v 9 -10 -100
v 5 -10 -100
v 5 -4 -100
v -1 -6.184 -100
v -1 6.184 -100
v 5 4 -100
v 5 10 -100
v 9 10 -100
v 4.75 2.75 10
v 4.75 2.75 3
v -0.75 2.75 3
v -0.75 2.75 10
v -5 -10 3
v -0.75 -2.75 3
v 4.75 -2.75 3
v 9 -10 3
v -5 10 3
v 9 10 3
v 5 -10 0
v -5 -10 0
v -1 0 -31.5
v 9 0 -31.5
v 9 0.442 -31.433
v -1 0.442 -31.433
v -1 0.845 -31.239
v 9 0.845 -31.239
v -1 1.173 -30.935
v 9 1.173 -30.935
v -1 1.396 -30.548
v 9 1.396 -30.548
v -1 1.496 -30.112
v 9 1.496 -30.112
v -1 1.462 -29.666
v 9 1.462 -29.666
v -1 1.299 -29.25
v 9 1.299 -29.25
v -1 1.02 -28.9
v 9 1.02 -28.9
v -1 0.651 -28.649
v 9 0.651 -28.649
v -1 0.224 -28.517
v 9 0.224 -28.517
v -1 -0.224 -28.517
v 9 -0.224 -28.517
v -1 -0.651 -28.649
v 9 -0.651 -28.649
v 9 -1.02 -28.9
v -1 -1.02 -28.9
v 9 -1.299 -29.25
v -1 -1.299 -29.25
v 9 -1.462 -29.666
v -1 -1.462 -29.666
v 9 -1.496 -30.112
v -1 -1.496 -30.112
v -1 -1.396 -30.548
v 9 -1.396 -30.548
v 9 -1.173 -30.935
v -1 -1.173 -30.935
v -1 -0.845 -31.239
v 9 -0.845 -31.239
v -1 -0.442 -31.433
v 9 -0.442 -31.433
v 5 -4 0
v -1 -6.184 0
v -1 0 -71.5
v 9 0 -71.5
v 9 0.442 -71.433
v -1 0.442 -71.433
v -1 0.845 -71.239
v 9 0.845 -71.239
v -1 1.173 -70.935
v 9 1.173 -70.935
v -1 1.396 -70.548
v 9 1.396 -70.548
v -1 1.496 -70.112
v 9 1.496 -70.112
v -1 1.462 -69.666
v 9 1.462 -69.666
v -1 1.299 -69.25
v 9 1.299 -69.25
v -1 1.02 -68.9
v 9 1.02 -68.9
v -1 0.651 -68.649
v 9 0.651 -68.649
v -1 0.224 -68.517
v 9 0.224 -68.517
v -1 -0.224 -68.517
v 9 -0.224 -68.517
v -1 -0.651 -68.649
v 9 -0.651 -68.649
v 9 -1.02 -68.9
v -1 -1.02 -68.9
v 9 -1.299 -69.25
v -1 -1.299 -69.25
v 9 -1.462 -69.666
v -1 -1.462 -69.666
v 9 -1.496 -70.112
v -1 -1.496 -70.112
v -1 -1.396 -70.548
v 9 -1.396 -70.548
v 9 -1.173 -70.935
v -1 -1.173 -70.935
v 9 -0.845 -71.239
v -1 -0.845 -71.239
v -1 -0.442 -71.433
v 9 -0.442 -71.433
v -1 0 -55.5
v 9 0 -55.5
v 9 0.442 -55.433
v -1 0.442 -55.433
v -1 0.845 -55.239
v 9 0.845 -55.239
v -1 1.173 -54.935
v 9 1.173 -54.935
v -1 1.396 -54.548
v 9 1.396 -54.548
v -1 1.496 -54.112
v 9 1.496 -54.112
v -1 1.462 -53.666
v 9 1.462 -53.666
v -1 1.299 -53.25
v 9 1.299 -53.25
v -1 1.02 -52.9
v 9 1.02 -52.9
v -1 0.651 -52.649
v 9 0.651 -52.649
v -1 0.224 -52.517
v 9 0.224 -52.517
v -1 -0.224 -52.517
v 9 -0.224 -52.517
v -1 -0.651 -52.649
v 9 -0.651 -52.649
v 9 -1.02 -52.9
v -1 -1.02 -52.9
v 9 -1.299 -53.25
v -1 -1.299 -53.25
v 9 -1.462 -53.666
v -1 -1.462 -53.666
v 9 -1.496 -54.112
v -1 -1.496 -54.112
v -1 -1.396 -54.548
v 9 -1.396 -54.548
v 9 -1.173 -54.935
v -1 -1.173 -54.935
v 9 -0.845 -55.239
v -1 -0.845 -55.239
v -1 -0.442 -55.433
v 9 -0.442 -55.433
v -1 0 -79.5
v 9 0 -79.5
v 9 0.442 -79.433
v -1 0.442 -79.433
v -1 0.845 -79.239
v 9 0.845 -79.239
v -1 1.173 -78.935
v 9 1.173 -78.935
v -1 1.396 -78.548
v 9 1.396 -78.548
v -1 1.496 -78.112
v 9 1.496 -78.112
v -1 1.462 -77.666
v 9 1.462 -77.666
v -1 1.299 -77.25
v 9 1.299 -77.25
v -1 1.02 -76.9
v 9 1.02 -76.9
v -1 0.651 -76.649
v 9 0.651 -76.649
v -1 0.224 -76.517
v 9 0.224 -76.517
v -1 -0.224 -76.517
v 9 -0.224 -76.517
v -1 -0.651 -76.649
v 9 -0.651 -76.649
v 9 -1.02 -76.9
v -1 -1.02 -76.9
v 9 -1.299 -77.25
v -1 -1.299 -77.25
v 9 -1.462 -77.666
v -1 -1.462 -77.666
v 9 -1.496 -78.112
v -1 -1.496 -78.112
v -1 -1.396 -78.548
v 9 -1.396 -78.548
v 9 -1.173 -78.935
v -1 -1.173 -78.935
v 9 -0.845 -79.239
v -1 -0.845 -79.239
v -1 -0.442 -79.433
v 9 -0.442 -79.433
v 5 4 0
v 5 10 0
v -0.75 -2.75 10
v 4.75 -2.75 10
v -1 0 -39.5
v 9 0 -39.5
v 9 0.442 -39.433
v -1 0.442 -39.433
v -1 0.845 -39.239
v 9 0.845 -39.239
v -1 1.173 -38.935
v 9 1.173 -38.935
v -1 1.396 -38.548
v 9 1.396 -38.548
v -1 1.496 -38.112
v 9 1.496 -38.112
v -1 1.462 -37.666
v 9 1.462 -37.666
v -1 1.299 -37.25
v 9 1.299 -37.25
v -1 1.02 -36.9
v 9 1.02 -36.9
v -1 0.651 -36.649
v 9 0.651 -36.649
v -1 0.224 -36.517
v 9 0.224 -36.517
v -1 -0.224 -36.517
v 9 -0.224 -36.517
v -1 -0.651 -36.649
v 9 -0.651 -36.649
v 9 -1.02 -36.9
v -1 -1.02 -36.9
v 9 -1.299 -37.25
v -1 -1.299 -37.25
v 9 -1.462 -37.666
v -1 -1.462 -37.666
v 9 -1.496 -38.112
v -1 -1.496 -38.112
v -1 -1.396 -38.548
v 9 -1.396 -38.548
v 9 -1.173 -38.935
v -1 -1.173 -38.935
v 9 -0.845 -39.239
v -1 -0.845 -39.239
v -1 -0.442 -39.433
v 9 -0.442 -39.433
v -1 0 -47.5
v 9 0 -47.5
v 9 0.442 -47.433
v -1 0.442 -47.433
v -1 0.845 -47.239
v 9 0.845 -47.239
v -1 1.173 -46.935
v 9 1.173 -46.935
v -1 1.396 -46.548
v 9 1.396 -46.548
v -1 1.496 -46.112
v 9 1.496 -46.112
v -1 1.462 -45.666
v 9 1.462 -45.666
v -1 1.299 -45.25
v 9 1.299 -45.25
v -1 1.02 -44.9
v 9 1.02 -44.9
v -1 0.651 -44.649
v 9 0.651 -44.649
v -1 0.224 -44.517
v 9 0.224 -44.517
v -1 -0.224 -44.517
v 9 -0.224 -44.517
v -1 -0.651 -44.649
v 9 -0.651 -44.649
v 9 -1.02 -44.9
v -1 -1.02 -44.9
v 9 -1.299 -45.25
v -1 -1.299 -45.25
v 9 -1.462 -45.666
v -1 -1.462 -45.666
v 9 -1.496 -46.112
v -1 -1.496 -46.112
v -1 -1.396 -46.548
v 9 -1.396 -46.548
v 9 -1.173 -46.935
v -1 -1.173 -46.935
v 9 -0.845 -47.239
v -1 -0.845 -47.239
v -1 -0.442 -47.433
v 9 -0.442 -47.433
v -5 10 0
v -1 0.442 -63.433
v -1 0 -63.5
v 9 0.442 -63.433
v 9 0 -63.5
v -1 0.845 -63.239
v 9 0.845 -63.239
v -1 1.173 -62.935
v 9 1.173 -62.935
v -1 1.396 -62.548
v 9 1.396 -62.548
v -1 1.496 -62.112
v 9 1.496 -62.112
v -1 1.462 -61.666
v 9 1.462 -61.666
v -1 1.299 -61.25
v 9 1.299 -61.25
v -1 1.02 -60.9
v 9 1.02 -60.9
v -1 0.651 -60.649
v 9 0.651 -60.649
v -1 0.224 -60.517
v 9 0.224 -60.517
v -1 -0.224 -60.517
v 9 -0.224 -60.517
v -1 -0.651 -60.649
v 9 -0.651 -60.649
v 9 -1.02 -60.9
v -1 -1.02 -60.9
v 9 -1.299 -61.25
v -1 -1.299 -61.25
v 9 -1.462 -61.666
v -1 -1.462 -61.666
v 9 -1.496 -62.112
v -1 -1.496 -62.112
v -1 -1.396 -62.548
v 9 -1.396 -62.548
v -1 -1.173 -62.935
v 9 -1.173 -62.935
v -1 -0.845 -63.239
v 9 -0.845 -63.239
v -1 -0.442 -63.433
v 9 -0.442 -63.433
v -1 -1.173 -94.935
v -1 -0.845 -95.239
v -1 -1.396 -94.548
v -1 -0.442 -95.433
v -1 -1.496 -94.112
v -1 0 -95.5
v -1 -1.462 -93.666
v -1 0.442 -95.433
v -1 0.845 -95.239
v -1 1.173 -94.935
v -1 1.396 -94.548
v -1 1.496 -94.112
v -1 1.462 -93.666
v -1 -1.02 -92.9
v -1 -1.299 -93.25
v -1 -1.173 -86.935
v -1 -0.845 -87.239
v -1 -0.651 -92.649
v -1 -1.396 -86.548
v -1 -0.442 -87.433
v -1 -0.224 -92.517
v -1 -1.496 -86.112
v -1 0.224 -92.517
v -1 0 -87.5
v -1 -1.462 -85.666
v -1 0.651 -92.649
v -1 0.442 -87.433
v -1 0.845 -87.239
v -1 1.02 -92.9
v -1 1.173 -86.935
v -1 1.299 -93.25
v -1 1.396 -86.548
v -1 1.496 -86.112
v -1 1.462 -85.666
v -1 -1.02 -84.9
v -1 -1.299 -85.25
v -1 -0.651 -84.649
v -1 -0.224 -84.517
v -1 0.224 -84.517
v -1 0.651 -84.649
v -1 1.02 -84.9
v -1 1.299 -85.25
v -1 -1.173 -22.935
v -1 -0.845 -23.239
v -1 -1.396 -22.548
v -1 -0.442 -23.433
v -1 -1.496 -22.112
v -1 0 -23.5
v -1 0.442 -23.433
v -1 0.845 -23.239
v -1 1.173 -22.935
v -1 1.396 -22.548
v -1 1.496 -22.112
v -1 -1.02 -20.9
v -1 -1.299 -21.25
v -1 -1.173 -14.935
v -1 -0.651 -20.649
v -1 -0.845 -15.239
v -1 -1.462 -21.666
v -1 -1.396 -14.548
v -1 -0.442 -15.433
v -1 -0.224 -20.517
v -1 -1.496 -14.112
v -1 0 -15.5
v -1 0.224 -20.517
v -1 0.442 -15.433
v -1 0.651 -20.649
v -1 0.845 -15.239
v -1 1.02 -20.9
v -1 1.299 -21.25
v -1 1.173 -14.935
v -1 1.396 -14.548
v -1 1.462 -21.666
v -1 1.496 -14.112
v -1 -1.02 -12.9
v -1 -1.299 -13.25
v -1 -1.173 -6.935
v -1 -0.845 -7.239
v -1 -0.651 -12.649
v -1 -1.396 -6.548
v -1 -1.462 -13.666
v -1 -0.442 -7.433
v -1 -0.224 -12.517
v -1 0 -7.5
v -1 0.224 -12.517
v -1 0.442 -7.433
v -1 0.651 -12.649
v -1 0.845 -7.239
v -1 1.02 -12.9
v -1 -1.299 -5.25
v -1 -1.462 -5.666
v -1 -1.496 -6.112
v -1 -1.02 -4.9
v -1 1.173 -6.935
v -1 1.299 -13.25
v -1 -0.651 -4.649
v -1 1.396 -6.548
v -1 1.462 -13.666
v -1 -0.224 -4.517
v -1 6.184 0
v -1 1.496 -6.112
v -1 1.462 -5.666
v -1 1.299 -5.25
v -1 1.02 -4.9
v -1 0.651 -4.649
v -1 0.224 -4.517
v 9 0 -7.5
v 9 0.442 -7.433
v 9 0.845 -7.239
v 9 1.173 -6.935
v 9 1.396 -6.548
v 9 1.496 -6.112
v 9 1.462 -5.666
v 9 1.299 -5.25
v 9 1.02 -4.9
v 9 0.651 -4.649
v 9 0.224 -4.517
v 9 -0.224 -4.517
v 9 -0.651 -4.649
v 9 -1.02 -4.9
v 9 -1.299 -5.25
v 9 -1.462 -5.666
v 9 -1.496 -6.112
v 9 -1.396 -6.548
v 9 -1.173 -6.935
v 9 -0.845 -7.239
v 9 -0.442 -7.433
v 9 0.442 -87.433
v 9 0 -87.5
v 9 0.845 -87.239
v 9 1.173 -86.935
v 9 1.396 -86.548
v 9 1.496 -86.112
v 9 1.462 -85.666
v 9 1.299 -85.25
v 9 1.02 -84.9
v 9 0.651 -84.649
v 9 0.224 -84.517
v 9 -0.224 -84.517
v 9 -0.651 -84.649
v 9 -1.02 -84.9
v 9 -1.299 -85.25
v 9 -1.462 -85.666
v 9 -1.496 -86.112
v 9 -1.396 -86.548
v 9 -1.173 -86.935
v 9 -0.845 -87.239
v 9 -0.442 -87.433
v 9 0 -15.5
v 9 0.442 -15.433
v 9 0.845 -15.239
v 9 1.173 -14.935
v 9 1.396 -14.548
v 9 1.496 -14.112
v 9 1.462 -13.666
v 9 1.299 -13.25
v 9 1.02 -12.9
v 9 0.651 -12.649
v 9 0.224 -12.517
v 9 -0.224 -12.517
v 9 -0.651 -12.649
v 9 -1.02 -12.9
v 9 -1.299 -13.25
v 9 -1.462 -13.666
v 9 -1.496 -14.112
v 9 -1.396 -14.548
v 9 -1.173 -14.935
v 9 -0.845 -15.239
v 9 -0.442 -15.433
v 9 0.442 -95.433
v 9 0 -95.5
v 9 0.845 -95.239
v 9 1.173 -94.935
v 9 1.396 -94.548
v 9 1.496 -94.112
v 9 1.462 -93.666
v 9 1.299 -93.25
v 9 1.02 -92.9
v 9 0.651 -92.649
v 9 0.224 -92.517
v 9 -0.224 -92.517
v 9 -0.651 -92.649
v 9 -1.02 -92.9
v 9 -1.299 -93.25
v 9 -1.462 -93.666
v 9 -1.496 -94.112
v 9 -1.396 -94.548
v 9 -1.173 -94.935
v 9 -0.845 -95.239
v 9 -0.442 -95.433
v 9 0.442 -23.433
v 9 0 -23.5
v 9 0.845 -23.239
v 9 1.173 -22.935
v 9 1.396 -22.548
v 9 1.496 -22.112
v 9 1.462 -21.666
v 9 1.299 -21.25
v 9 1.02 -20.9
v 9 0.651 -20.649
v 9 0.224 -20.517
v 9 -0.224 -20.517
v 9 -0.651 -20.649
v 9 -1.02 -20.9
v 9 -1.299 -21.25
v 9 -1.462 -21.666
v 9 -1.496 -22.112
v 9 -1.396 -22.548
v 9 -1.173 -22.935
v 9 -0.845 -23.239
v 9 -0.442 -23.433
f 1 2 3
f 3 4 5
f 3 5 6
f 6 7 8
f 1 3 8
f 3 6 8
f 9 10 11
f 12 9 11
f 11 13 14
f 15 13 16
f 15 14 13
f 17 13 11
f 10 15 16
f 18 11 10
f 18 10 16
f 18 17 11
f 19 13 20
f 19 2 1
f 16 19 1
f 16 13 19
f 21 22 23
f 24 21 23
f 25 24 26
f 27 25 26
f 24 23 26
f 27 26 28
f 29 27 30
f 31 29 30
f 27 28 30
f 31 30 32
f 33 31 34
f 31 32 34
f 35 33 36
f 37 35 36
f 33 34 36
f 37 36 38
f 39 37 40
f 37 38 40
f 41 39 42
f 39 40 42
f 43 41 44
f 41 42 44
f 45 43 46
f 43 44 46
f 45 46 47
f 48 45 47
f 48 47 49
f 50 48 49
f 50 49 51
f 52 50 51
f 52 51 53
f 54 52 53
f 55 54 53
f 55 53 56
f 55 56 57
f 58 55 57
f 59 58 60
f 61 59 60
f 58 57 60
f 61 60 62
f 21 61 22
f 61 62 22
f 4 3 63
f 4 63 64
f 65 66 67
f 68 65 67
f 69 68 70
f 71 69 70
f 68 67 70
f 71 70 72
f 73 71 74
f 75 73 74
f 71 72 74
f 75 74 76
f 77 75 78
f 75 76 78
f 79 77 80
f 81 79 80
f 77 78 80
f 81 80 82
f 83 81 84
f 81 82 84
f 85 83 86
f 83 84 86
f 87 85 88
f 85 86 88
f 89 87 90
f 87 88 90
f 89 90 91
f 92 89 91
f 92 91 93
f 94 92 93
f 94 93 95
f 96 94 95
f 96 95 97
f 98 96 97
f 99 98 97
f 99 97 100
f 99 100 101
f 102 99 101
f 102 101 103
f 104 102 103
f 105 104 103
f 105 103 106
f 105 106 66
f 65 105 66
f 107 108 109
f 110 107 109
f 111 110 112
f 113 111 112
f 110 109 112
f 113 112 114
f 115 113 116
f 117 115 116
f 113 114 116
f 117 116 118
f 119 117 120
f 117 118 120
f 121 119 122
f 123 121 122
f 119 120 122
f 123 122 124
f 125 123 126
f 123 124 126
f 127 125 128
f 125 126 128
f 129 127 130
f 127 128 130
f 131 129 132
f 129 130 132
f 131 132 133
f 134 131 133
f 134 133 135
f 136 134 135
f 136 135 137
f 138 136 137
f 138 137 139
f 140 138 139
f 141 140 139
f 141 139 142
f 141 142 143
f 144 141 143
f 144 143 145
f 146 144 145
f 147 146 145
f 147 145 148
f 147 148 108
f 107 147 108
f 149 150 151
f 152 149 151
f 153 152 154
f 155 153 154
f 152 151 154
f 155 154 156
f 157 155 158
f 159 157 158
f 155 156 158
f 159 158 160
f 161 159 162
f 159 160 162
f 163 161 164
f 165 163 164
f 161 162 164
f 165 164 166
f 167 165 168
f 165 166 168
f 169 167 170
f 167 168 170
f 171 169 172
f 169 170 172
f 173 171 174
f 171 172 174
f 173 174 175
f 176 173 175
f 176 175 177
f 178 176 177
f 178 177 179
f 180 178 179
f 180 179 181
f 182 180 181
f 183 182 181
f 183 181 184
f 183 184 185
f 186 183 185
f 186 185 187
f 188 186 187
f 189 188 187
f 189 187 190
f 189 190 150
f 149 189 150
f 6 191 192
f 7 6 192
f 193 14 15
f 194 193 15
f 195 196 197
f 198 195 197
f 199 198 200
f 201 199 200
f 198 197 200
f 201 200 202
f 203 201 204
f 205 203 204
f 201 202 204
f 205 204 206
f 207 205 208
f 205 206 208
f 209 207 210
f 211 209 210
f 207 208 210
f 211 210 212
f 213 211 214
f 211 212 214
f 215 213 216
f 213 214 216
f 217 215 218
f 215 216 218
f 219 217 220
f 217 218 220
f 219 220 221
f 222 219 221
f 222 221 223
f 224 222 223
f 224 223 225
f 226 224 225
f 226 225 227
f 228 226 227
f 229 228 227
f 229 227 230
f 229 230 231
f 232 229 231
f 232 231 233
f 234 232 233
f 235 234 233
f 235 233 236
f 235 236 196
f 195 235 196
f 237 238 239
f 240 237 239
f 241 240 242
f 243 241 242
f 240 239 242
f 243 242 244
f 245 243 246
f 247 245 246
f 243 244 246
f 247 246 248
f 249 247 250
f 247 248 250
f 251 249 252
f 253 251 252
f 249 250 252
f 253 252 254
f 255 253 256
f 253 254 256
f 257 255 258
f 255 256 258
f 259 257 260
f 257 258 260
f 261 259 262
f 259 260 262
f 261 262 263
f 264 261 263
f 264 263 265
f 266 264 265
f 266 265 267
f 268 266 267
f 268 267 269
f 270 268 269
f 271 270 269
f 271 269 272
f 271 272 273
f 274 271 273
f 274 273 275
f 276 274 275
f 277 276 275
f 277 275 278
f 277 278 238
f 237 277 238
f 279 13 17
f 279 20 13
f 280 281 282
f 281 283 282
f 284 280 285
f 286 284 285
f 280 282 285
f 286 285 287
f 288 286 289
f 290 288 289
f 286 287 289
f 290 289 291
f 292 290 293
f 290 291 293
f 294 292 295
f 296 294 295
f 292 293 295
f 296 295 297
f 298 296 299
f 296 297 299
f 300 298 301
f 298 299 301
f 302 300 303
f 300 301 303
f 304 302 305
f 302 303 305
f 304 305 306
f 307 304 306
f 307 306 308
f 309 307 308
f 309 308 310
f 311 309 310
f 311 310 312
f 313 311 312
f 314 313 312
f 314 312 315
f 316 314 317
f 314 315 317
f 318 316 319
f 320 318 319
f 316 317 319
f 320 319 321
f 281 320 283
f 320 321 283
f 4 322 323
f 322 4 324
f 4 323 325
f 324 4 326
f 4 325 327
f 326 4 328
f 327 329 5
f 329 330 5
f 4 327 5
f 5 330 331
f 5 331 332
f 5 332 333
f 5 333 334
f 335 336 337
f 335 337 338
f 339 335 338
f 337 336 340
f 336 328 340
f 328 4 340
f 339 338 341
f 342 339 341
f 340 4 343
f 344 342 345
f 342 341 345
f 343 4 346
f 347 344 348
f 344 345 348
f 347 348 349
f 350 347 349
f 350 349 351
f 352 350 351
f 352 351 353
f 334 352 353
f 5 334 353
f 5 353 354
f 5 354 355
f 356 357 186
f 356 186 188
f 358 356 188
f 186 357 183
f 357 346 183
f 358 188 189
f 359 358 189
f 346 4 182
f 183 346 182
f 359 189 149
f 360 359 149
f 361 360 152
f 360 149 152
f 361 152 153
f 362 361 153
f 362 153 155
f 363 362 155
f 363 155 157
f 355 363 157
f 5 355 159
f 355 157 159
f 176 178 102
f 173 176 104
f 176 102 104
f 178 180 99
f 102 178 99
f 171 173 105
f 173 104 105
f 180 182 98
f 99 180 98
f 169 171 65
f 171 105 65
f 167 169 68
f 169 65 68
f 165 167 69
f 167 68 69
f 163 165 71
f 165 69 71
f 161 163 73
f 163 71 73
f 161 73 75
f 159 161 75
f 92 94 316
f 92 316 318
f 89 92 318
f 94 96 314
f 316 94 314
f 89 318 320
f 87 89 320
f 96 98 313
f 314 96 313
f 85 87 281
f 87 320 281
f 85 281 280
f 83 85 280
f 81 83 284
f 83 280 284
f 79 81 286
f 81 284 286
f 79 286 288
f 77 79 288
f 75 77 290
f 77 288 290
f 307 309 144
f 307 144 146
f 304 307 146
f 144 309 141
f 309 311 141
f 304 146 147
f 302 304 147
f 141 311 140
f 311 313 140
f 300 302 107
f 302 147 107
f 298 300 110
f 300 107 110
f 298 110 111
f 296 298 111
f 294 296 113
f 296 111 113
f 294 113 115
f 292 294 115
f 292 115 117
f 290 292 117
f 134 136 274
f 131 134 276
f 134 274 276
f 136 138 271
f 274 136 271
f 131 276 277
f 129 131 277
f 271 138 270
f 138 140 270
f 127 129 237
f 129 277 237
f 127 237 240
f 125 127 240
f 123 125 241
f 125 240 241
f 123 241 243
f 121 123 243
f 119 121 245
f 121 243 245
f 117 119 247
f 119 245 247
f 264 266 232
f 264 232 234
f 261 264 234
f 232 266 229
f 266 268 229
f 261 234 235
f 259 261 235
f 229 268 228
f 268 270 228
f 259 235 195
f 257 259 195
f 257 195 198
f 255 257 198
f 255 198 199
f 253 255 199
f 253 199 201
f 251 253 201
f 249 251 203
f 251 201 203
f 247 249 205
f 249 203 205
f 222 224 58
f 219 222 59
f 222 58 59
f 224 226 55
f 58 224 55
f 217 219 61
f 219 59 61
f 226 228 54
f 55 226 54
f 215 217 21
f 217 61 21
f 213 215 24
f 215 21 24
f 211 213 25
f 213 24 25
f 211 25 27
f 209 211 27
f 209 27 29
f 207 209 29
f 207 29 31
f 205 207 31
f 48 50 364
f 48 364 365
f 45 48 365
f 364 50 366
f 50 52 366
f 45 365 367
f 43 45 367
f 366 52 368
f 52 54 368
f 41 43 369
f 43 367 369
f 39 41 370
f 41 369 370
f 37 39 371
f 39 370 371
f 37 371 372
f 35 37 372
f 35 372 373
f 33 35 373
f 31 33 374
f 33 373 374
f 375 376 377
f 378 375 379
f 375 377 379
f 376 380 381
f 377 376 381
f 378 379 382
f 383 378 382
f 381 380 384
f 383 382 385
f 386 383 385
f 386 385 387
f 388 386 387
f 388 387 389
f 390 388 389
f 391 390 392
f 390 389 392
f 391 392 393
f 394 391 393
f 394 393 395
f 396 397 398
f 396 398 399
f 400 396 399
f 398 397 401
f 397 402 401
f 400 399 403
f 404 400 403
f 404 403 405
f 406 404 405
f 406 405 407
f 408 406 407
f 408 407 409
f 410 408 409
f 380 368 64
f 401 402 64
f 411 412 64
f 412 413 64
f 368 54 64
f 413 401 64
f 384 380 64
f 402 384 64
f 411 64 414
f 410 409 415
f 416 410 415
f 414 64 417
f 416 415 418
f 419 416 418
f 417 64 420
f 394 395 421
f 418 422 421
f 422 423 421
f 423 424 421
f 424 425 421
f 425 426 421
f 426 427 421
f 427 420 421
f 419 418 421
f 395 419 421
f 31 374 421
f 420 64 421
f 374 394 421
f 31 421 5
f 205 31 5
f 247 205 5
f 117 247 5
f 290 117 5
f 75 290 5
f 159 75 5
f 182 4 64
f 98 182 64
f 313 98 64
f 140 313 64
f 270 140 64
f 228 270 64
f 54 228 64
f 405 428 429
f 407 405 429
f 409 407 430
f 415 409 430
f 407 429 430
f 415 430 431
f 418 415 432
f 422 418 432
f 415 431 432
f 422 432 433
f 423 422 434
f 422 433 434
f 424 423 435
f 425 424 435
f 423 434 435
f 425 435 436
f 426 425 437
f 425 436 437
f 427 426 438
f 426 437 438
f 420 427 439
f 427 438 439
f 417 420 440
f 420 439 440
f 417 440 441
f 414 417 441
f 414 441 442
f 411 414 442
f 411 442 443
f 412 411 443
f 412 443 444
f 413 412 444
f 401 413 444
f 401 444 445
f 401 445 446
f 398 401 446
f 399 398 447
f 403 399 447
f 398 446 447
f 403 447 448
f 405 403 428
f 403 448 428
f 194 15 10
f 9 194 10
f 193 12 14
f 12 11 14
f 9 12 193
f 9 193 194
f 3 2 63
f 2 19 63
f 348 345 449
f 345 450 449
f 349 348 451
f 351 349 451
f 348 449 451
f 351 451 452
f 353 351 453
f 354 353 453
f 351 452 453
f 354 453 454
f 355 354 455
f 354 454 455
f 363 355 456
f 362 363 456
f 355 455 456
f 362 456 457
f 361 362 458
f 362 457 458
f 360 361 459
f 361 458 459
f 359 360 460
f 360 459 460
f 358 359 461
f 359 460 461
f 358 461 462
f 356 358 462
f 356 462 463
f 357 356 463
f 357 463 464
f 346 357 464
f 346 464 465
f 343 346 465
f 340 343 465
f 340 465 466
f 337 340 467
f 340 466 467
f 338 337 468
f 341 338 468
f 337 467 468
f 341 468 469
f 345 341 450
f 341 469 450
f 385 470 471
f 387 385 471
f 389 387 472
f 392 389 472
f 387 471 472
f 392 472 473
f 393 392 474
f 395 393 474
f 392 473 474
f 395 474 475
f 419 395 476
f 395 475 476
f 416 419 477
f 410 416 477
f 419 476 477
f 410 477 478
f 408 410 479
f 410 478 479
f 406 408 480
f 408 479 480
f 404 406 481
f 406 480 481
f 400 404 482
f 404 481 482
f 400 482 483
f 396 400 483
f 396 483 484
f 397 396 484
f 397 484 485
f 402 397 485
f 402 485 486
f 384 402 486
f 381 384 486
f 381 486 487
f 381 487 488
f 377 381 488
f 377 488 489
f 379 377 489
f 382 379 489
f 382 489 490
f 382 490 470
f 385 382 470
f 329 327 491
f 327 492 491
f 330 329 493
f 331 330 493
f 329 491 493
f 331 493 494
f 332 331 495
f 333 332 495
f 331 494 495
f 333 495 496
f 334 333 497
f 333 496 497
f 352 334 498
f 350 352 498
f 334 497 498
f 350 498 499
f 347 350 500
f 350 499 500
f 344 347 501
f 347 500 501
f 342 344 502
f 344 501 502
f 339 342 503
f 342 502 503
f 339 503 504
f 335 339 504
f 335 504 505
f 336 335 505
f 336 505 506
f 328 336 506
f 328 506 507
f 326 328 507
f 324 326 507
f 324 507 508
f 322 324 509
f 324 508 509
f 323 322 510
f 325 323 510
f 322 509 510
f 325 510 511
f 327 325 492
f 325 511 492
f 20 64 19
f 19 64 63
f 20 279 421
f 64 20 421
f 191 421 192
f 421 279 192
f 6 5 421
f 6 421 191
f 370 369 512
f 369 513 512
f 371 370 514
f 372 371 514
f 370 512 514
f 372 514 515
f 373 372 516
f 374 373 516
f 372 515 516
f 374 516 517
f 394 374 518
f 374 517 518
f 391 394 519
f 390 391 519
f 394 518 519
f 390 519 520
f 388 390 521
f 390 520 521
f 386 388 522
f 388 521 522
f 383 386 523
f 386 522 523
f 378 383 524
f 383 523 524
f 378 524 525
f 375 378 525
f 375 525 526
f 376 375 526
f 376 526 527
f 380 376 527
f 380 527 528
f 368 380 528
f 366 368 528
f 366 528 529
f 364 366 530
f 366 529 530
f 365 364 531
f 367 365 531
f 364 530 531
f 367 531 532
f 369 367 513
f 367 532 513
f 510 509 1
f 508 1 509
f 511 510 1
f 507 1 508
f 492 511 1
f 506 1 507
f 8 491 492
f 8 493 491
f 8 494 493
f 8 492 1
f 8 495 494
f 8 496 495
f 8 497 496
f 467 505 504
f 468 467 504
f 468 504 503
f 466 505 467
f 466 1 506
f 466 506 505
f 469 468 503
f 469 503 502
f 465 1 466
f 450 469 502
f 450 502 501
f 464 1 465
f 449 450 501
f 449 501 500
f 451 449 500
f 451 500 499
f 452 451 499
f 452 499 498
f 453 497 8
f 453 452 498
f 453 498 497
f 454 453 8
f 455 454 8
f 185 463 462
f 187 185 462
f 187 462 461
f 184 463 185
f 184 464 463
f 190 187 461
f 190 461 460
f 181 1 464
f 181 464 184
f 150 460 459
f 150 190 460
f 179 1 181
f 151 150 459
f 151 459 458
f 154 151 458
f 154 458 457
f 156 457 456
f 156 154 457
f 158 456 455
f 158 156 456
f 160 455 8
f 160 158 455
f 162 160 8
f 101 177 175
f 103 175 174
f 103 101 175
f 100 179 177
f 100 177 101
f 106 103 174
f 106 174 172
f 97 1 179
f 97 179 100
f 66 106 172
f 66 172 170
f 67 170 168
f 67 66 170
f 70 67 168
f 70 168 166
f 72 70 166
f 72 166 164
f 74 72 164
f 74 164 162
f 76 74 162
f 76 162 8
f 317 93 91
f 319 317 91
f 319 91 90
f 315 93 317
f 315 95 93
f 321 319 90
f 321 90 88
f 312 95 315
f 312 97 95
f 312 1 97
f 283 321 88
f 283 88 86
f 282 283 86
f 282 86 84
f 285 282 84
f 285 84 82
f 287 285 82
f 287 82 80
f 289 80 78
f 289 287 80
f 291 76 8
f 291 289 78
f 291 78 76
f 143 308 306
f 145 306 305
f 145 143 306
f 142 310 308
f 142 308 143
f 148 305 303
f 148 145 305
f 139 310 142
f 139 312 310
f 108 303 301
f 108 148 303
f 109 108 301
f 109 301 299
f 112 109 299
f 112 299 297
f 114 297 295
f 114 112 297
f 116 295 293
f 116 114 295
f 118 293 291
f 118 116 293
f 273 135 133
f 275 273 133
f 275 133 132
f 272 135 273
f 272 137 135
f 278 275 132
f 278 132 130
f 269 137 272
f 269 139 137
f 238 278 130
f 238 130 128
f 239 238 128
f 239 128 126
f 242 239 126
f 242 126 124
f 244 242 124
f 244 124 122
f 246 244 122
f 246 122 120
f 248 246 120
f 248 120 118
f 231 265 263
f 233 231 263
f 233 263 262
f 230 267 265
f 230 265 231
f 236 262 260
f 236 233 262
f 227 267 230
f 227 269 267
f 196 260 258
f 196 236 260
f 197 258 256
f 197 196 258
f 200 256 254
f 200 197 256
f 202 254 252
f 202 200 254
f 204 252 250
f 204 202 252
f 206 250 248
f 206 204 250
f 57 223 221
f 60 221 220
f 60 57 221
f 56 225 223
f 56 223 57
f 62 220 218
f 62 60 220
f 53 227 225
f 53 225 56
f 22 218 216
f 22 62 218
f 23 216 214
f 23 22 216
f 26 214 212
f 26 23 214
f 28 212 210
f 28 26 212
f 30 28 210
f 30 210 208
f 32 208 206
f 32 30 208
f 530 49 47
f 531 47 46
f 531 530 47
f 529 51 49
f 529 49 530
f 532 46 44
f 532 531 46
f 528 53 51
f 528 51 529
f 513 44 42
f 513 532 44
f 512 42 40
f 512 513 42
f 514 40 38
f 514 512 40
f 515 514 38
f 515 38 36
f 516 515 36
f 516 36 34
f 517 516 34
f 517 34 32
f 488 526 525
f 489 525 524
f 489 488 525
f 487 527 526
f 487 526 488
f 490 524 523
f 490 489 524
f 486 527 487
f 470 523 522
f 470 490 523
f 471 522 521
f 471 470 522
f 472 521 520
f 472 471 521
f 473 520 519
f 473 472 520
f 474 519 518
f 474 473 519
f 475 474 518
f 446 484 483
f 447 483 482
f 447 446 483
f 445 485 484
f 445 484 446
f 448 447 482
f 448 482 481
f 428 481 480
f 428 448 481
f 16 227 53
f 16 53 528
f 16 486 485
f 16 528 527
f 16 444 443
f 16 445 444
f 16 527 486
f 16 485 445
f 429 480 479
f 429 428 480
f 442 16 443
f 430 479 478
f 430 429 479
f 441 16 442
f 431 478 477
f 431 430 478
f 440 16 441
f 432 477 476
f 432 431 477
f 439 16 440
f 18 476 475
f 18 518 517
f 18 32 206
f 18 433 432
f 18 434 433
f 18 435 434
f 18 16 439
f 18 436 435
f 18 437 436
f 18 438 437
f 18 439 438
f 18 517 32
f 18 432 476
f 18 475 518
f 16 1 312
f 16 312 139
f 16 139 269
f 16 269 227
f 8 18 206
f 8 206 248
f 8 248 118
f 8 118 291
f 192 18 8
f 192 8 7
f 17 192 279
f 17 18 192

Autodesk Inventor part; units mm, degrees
ref_plane "YZ Plane" through (0, 0, 0) normal (1, 0, 0) x (0, 1, 0)
ref_plane "XZ Plane" through (0, 0, 0) normal (0, 1, 0) x (-1, 0, 0)
sketch "Sketch1" plane through (0, 0, 0) normal (0, 0, 1) x (1, 0, 0)
  line L0 (-5, 10) -> (-5, -10) projected
  line L1 (-5, -10) -> (5, -10) projected
  line L2 (5, -10) -> (5, -4) projected
  line L3 (5, -4) -> (-1, -6.1838) projected
  line L4 (-1, -6.1838) -> (-1, 6.1838) projected
  line L5 (-1, 6.1838) -> (5, 4) projected
  line L6 (5, 4) -> (5, 10) projected
  line L7 (5, 10) -> (-5, 10) projected
  line L8 (-1, -10) -> (9, -10)
  line L9 (9, -10) -> (9, 10)
  line L10 (9, 10) -> (-1, 10)
  line L11 (-1, 10) -> (-1, -10)
  point P0 (0, 0)
  dimension "d0" = 10
ref_plane "Work Plane1" through (-5, -10, -100) normal (0, 0, -1) x (0, 1, 0)
extrude "Extrusion1" add sketch "Sketch1" against normal up to surface (100 mm away) contours L10 L9 L8 L2 L3 L4 L5 L6
sketch "Sketch2" plane through (0, 0, 0) normal (0, 0, 1) x (1, 0, 0)
  line L0 (9, 10) -> (5, 10) projected
  line L1 (5, 10) -> (5, 4) projected
  line L2 (5, 4) -> (-1, 6.1838) projected
  line L3 (-1, 6.1838) -> (-1, -6.1838) projected
  line L4 (-1, -6.1838) -> (5, -4) projected
  line L5 (5, -4) -> (5, -10) projected
  line L6 (5, -10) -> (9, -10) projected
  line L7 (9, -10) -> (9, 10) projected
  line L8 (5, -10) -> (9, -10) projected
  line L9 (9, -10) -> (-5, -10)
  line L10 (-5, -10) -> (-5, 10)
  line L11 (-5, 10) -> (9, 10)
  line L12 (9, 10) -> (9, -10)
  point P0 (0, 0)
  dimension "d3" = 14
  dimension "d4" = 20
extrude "Extrusion2" add sketch "Sketch2" along normal blind 3
sketch "Sketch3" plane through (9, -10, -100) normal (1, 0, 0) x (0, 0, -1)
  line L0 (-100, 16.1838) -> (-100, 3.8162) projected
  circle A0 centre (-94, 10) radius 1.5
  line L1 (0, 0) -> (-103, 0) projected
  circle A1 centre (-86, 10) radius 1.5
  circle A2 centre (-78, 10) radius 1.5
  circle A3 centre (-70, 10) radius 1.5
  circle A4 centre (-62, 10) radius 1.5
  circle A5 centre (-54, 10) radius 1.5
  circle A6 centre (-46, 10) radius 1.5
  circle A7 centre (-38, 10) radius 1.5
  circle A8 centre (-30, 10) radius 1.5
  circle A9 centre (-22, 10) radius 1.5
  circle A10 centre (-14, 10) radius 1.5
  circle A11 centre (-6, 10) radius 1.5
  point P0 (-100, 10)
  dimension "d7" = 3
  dimension "d8" = 6
  dimension "d11" = 8
extrude "Extrusion3" cut sketch "Sketch3" against normal through all
sketch "Sketch4" plane through (0, 0, 3) normal (0, 0, 1) x (1, 0, 0)
  line L0 (-5, 10) -> (-5, -10) projected
  line L1 (-5, 10) -> (9, -10)
  line L2 (9, 10) -> (5, 10) projected
  line L3 (9, -10) -> (9, 10)
  line L4 (-5, -10) -> (5, -10) projected
  line L5 (9, 10) -> (-5, -10)
  line L6 (-0.75, -2.75) -> (4.75, -2.75)
  line L7 (4.75, -2.75) -> (4.75, 2.75)
  line L8 (4.75, 2.75) -> (-0.75, 2.75)
  line L9 (-0.75, 2.75) -> (-0.75, -2.75)
  line L10 (-0.75, -2.75) -> (4.75, 2.75) construction
  line L11 (4.75, -2.75) -> (-0.75, 2.75) construction
  point P0 (0, 0)
  point P1 (2, 0)
  dimension "d18" = 5.5
  dimension "d19" = 5.5
extrude "Extrusion4" add sketch "Sketch4" along normal blind 7 contours L8 L5 L1 | L1 L5 L6 L9 L8 | L5 L1 L6 | L5 L8 L7 L6 L1
properties part number "prismatic link outer"
